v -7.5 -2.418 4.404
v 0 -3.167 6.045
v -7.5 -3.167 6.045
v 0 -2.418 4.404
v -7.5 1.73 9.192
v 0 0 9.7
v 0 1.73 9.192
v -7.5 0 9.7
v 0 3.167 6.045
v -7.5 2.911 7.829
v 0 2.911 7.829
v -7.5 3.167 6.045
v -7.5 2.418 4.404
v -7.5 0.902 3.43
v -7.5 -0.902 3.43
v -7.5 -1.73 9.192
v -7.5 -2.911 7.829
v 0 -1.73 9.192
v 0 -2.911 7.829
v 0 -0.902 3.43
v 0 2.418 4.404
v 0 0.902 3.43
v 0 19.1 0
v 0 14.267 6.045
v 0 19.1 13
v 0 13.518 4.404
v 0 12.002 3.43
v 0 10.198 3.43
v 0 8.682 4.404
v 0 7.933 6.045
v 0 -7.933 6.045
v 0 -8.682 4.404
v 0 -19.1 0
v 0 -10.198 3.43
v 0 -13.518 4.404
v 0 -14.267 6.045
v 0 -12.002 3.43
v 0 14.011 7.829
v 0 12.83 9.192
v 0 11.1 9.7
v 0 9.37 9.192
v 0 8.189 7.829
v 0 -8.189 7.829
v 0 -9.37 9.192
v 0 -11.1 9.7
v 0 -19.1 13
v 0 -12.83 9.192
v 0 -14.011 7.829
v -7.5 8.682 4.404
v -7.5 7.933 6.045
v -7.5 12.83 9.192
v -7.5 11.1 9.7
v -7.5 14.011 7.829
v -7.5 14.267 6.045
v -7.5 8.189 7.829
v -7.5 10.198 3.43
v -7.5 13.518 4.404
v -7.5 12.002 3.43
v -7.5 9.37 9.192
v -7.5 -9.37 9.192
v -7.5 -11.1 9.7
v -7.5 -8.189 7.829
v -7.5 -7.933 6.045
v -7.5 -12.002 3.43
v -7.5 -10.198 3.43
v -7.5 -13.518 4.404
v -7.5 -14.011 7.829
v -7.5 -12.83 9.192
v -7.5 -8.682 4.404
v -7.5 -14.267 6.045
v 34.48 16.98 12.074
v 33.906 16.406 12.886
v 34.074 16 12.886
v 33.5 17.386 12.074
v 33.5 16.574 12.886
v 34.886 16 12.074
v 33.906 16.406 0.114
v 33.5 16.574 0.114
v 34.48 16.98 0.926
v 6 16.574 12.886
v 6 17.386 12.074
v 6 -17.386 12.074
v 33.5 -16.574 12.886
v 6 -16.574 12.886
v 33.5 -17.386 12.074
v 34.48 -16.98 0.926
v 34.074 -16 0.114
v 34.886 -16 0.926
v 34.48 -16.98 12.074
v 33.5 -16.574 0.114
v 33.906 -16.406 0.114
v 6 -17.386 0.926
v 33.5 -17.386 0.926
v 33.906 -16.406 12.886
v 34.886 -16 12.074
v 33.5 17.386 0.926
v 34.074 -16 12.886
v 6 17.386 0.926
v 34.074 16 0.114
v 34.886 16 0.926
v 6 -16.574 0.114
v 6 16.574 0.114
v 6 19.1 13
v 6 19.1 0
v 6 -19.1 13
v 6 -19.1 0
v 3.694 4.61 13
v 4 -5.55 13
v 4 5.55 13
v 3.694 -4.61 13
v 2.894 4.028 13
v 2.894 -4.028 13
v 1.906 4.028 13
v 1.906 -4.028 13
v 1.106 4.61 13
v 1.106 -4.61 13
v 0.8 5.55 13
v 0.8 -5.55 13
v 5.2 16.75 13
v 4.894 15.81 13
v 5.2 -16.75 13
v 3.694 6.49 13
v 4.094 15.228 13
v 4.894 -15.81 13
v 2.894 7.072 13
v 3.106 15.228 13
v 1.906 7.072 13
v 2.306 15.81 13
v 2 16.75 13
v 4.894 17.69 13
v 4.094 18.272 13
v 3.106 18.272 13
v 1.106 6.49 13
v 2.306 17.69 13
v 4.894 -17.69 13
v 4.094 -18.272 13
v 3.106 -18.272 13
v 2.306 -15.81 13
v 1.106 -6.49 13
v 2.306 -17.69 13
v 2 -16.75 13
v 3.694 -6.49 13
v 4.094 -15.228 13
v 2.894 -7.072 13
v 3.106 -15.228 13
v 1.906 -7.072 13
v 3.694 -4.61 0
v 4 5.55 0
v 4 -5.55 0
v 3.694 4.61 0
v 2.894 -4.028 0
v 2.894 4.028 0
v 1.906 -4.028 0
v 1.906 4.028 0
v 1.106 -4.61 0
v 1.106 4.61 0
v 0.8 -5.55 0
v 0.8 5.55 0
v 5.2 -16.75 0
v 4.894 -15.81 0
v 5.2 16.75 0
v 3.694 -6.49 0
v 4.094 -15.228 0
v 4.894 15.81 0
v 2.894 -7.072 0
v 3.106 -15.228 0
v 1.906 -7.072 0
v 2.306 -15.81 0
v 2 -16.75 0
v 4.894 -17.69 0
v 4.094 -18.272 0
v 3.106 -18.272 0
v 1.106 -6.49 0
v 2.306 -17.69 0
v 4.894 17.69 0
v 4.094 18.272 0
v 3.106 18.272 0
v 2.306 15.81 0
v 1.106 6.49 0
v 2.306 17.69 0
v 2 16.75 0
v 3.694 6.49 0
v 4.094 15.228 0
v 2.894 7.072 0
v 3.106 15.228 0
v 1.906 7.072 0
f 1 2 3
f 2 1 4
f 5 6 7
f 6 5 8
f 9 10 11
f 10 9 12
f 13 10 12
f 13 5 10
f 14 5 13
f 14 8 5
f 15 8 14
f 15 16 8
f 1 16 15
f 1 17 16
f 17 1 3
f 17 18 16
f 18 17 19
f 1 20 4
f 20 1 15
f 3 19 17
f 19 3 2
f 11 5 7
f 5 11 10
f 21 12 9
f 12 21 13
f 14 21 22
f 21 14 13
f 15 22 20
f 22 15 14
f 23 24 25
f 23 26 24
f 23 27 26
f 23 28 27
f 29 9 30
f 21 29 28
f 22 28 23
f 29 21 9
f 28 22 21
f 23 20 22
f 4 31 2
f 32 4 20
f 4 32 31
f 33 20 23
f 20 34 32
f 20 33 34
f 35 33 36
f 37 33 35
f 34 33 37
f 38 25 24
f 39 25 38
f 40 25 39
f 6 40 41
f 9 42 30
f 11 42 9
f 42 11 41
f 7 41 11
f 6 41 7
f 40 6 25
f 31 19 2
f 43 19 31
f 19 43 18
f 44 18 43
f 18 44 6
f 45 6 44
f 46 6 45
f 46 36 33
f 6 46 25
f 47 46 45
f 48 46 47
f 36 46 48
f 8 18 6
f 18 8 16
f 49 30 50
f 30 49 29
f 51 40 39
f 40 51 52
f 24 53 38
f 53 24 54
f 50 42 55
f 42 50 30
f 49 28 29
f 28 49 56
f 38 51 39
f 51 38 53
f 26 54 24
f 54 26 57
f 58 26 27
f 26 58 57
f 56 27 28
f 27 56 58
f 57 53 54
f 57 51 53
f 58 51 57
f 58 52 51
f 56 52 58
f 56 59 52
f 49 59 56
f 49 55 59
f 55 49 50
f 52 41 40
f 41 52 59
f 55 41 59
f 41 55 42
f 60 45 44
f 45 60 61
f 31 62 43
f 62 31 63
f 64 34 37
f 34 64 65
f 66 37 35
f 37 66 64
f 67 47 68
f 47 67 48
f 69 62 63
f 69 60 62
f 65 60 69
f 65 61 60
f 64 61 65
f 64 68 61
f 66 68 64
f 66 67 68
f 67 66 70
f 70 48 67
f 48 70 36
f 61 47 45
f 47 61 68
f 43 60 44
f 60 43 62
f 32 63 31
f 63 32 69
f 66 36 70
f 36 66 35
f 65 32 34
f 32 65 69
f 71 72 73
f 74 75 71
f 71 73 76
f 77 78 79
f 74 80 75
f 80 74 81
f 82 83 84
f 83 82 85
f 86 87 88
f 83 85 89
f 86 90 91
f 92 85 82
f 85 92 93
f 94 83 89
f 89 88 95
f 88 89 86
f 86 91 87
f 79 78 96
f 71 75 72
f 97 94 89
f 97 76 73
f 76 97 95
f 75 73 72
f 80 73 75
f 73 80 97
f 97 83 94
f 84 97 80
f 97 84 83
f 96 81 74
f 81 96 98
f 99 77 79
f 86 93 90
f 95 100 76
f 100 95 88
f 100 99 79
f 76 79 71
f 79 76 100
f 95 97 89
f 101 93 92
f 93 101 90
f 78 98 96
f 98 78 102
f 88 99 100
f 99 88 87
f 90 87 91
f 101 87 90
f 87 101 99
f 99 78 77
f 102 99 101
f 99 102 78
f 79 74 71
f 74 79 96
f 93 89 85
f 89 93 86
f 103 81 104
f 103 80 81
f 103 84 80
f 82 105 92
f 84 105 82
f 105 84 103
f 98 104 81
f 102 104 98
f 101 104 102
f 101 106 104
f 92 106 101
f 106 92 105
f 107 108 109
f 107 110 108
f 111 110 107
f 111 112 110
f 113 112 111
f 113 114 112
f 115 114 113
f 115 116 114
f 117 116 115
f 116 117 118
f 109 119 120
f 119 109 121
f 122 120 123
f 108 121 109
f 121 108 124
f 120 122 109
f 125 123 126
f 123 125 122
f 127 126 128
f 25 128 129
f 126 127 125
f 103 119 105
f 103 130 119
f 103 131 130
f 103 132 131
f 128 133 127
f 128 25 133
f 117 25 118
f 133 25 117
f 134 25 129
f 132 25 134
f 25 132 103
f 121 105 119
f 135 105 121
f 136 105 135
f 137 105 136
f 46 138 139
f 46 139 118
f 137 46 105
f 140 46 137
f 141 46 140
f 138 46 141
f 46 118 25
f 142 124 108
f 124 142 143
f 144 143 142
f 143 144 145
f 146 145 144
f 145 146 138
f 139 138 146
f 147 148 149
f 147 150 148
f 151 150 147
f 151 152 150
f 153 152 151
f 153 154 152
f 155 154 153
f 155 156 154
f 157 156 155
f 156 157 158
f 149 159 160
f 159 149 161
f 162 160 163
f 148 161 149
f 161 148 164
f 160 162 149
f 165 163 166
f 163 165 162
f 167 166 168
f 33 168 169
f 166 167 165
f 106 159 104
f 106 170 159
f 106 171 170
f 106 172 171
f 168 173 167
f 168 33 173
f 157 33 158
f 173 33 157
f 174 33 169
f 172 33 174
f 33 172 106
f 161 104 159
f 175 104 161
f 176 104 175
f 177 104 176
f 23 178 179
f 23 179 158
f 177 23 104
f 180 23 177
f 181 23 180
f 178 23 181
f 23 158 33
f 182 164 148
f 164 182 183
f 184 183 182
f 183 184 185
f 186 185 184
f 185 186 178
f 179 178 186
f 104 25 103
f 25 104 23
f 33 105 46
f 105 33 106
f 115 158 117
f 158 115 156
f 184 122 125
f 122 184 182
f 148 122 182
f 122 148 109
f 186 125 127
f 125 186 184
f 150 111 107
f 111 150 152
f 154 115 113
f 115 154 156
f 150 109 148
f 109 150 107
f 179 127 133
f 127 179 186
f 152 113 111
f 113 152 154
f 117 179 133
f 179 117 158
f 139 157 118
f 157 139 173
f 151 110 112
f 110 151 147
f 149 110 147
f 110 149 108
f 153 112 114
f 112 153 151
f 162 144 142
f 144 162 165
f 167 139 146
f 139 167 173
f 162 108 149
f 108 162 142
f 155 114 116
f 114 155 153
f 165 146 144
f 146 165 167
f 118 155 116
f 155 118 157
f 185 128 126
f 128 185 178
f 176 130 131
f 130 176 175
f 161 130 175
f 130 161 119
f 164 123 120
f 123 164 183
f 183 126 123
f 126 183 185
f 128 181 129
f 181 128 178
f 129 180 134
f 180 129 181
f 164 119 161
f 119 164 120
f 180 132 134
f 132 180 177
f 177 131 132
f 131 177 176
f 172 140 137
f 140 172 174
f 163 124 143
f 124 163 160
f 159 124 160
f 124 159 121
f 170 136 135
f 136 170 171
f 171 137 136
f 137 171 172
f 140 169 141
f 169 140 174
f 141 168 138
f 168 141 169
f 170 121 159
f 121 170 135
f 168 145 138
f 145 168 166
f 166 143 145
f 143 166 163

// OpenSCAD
module cCube(v){
    x = -v[0]/2;
    y = -v[1]/2;
    translate([x, y, 0]) cube(v);
}

module quad(x, y){
    translate(0.5*[x, y , 0]) children();
    translate(0.5*[x, -y , 0]) children();
    translate(0.5*[-x, y , 0]) children();
    translate(0.5*[-x, -y , 0]) children();
}
module x(d){
    translate([d,0,0]) children();
}

module y(d){
    translate([0,d,0]) children();
}

module z(d){
    translate([0,0,d]) children();
}

module placeSmaOnSp2t(){
    d=11.1;
    z(13/2) {
        rotate([0,-90,0]) children();
        y(d) rotate([0,-90,0]) children();
        y(-d) rotate([0,-90,0]) children();
    }
}

module placeScrewHolesOnSp2t(){
    r=3.2/2;
    d1 = 14.3/2-r;
    d2 = 36.7/2-r;
    l1=0.8+r;
    l2=2+r;
    translate([l1, d1, 0]) children();
    translate([l1, -d1, 0]) children();
    translate([l2, d2, 0]) children();
    translate([l2, -d2, 0]) children();
}

module relaySp2tBody(){
    r = 1.5;
    d = [32, 35, 13];
    d2 = [6, 38.2, 13];
    x(d2[0]/2+d[0]/2)z(r){
        hull(){
            quad(d[0]-2*r, d[1]-2*r) sphere(r, $fn=8);
            z(d[2]-2*r)quad(d[0]-2*r, d[1]-2*r) sphere(r, $fn=8);
        }
    }
    x(d2[0]/2) cCube(d2);
    placeSmaOnSp2t()cylinder(7.5, 3.2, 3.2);
}
module relaySp2t(){
    difference(){
        relaySp2tBody();
        placeScrewHolesOnSp2t() cylinder(20, 1.6, 1.6, $fn=10);
    }
}


relaySp2t();
